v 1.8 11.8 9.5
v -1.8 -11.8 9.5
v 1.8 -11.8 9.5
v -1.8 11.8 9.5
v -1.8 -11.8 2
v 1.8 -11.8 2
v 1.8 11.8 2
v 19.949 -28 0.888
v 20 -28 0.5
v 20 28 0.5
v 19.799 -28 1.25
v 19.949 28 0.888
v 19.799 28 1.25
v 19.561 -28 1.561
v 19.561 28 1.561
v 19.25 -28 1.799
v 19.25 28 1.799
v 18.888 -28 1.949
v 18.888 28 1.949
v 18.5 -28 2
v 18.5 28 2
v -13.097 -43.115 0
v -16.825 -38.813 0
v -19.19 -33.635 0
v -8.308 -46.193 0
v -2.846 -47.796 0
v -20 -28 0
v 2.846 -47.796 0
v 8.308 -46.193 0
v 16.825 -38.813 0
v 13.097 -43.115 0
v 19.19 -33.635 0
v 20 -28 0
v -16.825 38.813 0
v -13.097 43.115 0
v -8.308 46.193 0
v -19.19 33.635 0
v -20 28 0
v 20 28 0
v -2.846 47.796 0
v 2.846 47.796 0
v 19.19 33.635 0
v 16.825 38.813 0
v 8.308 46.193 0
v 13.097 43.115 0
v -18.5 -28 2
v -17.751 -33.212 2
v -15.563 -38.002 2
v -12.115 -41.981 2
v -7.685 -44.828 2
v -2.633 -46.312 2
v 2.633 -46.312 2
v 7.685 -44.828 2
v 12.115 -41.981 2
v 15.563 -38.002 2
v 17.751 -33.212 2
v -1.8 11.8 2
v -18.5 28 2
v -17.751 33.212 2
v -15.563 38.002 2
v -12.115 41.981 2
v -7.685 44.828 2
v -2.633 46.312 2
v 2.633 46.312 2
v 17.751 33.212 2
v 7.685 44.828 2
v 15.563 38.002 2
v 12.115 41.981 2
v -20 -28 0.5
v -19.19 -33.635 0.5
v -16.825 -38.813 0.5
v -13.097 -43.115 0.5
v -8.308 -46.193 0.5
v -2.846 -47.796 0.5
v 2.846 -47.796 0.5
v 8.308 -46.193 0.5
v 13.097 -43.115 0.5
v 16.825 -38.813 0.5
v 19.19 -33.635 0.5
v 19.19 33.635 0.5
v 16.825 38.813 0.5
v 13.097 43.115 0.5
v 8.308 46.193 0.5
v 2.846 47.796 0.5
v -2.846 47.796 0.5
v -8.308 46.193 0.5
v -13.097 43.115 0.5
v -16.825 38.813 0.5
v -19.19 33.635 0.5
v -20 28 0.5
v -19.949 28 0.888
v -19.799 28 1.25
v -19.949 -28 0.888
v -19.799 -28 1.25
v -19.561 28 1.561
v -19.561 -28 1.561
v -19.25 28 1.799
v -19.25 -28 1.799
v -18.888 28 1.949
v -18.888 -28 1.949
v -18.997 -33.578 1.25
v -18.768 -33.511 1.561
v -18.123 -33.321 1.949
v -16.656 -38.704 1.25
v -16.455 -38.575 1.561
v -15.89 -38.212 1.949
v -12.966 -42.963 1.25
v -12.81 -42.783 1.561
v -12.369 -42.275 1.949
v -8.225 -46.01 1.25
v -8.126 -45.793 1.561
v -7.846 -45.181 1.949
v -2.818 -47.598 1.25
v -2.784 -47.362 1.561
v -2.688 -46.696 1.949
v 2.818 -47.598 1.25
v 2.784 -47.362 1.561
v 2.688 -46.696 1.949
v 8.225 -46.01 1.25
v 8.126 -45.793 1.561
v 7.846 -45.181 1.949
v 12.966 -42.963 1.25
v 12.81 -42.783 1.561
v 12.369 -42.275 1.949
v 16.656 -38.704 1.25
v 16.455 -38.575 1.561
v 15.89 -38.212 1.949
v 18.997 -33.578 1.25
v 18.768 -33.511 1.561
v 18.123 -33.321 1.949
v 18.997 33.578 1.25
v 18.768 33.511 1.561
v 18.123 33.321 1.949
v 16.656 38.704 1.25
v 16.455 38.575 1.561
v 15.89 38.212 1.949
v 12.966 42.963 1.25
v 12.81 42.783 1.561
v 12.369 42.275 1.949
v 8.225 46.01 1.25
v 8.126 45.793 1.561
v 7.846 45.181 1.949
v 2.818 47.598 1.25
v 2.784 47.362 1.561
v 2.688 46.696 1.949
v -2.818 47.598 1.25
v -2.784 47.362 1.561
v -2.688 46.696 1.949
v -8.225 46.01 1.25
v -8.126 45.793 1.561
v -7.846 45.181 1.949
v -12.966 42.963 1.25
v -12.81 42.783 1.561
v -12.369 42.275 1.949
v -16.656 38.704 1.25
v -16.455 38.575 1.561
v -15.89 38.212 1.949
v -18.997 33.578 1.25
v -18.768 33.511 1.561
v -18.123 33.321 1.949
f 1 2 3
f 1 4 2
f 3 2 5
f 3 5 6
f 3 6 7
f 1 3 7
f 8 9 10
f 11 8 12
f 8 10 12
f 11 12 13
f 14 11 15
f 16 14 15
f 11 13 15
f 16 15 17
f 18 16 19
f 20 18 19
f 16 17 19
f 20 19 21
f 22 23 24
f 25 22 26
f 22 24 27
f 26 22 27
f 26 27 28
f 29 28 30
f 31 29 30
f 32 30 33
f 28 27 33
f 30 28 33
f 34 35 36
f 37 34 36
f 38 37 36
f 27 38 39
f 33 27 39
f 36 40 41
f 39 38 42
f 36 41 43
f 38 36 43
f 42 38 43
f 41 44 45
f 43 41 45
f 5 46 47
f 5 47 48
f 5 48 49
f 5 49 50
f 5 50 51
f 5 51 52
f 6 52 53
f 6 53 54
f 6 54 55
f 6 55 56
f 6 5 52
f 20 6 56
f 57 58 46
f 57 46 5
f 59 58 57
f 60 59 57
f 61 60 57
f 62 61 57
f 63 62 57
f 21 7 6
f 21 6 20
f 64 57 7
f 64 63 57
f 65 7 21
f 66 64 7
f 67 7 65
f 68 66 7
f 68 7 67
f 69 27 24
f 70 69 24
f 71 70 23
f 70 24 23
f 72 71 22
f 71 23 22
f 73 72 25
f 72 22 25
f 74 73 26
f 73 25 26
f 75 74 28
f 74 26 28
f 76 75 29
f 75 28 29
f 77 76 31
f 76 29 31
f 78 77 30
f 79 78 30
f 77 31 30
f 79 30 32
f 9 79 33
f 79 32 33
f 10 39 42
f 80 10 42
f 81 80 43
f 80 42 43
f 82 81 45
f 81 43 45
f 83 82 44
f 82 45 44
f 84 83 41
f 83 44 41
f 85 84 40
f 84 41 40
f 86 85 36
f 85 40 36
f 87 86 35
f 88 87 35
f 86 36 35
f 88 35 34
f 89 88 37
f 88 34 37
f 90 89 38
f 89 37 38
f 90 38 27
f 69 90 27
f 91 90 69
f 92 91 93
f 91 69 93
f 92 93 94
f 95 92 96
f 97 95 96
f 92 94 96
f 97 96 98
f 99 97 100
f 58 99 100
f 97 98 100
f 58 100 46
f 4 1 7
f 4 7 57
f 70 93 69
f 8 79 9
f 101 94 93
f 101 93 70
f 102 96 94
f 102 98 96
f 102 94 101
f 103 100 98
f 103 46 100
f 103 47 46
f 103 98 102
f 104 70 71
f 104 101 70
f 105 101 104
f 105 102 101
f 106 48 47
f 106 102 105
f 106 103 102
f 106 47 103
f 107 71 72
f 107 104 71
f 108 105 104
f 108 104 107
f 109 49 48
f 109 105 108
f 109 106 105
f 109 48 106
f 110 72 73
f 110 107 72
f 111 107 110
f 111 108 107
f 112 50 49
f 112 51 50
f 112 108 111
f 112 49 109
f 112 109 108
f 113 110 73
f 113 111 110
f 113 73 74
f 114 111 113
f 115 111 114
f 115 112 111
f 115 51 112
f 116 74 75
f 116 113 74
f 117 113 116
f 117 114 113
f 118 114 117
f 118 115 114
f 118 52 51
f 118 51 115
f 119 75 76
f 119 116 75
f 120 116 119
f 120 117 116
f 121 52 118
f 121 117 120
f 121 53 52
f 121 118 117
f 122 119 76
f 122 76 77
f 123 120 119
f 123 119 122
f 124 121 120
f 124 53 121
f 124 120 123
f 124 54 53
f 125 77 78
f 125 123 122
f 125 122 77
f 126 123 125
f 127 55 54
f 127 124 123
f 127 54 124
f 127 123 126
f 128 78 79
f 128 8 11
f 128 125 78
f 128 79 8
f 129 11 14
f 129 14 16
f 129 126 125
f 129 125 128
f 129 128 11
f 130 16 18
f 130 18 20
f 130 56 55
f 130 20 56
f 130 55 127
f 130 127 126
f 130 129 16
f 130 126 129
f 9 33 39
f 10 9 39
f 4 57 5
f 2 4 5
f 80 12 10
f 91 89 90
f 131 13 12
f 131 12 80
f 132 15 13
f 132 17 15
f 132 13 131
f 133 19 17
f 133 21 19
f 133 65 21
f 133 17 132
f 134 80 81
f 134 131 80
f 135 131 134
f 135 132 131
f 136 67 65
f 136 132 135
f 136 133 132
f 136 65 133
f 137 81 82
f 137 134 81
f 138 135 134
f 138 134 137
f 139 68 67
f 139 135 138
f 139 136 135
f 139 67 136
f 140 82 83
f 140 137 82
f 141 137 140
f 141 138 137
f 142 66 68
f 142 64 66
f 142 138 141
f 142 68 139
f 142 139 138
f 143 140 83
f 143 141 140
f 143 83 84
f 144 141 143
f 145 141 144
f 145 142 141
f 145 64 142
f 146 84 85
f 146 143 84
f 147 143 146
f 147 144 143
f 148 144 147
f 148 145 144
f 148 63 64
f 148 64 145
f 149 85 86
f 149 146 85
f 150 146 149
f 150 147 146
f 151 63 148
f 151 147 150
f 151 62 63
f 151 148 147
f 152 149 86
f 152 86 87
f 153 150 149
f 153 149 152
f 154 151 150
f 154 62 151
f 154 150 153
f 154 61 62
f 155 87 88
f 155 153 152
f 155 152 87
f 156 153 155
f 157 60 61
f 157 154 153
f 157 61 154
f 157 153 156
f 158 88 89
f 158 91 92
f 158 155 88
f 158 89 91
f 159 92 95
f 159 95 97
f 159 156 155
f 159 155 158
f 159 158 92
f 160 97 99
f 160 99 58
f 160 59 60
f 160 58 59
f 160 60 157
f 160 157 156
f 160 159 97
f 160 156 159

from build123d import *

# Parameters (mm, degrees)
F2_DEPTH = 1
F4_DEPTH = 2
F5_W     = 1.8
F5_H     = 11.8
F6_DEPTH = 7.5
F7_R     = 1.5


with BuildPart() as f2:
    # F1 (on Top) → F2 (new body)
    with BuildSketch(Plane.XY):
        with BuildLine():
            Line((0, 23), (0, 0))
            Line((0, 0), (-5, 0))
            Line((-5, 0), (-5, -28))
            ThreePointArc((-5, -28), (0, -23), (5, -28))
            Line((5, -28), (5, 0))
            Line((5, 0), (5, 28))
            ThreePointArc((5, 28), (3.5355339059, 24.4644660941), (0, 23))
        make_face()
        with BuildLine():
            Line((-5, 0), (0, 0))
            Line((0, 0), (0, 23))
            ThreePointArc((0, 23), (-3.5355339059, 24.4644660941), (-5, 28))
            Line((-5, 28), (-5, 0))
        make_face()
        with BuildLine():
            ThreePointArc((-5, 28), (-3.5355339059, 24.4644660941), (0, 23))
            Line((0, 23), (0, 28))
            Line((0, 28), (-5, 28))
        make_face()
        with BuildLine():
            Line((0, 28), (0, 23))
            ThreePointArc((0, 23), (3.5355339059, 24.4644660941), (5, 28))
            Line((5, 28), (0, 28))
        make_face()
        with BuildLine():
            ThreePointArc((5, 28), (0, 33), (-5, 28))
            Line((-5, 28), (0, 28))
            Line((0, 28), (5, 28))
        make_face()
        with BuildLine():
            ThreePointArc((5, -28), (0, -23), (-5, -28))
            ThreePointArc((-5, -28), (0, -33), (5, -28))
        make_face()
    extrude(amount=F2_DEPTH)

    # F3 (on Top) → F4 (join)
    with BuildSketch(Plane.XY):
        with BuildLine():
            Line((-20, 28), (-20, -28))
            ThreePointArc((-20, -28), (0, -48), (20, -28))
            Line((20, -28), (20, 28))
            ThreePointArc((20, 28), (0, 48), (-20, 28))
        make_face()
    extrude(amount=F4_DEPTH)

    # F5 (on face) → F6 (join)
    with BuildSketch(Plane.XY.offset(2)):
        with Locations((-0.9, -5.9)):
            Rectangle(F5_W, F5_H)
        with Locations((-0.9, 5.9)):
            Rectangle(F5_W, F5_H)
        with Locations((0.9, 5.9)):
            Rectangle(F5_W, F5_H)
        with Locations((0.9, -5.9)):
            Rectangle(F5_W, F5_H)
    extrude(amount=F6_DEPTH)

    # F7
    f7_edges = [f2.edges().sort_by_distance(p)[0] for p in [
        (-20, 0, 2),
    ]]
    fillet(f7_edges, radius=F7_R)


solid = f2.part
